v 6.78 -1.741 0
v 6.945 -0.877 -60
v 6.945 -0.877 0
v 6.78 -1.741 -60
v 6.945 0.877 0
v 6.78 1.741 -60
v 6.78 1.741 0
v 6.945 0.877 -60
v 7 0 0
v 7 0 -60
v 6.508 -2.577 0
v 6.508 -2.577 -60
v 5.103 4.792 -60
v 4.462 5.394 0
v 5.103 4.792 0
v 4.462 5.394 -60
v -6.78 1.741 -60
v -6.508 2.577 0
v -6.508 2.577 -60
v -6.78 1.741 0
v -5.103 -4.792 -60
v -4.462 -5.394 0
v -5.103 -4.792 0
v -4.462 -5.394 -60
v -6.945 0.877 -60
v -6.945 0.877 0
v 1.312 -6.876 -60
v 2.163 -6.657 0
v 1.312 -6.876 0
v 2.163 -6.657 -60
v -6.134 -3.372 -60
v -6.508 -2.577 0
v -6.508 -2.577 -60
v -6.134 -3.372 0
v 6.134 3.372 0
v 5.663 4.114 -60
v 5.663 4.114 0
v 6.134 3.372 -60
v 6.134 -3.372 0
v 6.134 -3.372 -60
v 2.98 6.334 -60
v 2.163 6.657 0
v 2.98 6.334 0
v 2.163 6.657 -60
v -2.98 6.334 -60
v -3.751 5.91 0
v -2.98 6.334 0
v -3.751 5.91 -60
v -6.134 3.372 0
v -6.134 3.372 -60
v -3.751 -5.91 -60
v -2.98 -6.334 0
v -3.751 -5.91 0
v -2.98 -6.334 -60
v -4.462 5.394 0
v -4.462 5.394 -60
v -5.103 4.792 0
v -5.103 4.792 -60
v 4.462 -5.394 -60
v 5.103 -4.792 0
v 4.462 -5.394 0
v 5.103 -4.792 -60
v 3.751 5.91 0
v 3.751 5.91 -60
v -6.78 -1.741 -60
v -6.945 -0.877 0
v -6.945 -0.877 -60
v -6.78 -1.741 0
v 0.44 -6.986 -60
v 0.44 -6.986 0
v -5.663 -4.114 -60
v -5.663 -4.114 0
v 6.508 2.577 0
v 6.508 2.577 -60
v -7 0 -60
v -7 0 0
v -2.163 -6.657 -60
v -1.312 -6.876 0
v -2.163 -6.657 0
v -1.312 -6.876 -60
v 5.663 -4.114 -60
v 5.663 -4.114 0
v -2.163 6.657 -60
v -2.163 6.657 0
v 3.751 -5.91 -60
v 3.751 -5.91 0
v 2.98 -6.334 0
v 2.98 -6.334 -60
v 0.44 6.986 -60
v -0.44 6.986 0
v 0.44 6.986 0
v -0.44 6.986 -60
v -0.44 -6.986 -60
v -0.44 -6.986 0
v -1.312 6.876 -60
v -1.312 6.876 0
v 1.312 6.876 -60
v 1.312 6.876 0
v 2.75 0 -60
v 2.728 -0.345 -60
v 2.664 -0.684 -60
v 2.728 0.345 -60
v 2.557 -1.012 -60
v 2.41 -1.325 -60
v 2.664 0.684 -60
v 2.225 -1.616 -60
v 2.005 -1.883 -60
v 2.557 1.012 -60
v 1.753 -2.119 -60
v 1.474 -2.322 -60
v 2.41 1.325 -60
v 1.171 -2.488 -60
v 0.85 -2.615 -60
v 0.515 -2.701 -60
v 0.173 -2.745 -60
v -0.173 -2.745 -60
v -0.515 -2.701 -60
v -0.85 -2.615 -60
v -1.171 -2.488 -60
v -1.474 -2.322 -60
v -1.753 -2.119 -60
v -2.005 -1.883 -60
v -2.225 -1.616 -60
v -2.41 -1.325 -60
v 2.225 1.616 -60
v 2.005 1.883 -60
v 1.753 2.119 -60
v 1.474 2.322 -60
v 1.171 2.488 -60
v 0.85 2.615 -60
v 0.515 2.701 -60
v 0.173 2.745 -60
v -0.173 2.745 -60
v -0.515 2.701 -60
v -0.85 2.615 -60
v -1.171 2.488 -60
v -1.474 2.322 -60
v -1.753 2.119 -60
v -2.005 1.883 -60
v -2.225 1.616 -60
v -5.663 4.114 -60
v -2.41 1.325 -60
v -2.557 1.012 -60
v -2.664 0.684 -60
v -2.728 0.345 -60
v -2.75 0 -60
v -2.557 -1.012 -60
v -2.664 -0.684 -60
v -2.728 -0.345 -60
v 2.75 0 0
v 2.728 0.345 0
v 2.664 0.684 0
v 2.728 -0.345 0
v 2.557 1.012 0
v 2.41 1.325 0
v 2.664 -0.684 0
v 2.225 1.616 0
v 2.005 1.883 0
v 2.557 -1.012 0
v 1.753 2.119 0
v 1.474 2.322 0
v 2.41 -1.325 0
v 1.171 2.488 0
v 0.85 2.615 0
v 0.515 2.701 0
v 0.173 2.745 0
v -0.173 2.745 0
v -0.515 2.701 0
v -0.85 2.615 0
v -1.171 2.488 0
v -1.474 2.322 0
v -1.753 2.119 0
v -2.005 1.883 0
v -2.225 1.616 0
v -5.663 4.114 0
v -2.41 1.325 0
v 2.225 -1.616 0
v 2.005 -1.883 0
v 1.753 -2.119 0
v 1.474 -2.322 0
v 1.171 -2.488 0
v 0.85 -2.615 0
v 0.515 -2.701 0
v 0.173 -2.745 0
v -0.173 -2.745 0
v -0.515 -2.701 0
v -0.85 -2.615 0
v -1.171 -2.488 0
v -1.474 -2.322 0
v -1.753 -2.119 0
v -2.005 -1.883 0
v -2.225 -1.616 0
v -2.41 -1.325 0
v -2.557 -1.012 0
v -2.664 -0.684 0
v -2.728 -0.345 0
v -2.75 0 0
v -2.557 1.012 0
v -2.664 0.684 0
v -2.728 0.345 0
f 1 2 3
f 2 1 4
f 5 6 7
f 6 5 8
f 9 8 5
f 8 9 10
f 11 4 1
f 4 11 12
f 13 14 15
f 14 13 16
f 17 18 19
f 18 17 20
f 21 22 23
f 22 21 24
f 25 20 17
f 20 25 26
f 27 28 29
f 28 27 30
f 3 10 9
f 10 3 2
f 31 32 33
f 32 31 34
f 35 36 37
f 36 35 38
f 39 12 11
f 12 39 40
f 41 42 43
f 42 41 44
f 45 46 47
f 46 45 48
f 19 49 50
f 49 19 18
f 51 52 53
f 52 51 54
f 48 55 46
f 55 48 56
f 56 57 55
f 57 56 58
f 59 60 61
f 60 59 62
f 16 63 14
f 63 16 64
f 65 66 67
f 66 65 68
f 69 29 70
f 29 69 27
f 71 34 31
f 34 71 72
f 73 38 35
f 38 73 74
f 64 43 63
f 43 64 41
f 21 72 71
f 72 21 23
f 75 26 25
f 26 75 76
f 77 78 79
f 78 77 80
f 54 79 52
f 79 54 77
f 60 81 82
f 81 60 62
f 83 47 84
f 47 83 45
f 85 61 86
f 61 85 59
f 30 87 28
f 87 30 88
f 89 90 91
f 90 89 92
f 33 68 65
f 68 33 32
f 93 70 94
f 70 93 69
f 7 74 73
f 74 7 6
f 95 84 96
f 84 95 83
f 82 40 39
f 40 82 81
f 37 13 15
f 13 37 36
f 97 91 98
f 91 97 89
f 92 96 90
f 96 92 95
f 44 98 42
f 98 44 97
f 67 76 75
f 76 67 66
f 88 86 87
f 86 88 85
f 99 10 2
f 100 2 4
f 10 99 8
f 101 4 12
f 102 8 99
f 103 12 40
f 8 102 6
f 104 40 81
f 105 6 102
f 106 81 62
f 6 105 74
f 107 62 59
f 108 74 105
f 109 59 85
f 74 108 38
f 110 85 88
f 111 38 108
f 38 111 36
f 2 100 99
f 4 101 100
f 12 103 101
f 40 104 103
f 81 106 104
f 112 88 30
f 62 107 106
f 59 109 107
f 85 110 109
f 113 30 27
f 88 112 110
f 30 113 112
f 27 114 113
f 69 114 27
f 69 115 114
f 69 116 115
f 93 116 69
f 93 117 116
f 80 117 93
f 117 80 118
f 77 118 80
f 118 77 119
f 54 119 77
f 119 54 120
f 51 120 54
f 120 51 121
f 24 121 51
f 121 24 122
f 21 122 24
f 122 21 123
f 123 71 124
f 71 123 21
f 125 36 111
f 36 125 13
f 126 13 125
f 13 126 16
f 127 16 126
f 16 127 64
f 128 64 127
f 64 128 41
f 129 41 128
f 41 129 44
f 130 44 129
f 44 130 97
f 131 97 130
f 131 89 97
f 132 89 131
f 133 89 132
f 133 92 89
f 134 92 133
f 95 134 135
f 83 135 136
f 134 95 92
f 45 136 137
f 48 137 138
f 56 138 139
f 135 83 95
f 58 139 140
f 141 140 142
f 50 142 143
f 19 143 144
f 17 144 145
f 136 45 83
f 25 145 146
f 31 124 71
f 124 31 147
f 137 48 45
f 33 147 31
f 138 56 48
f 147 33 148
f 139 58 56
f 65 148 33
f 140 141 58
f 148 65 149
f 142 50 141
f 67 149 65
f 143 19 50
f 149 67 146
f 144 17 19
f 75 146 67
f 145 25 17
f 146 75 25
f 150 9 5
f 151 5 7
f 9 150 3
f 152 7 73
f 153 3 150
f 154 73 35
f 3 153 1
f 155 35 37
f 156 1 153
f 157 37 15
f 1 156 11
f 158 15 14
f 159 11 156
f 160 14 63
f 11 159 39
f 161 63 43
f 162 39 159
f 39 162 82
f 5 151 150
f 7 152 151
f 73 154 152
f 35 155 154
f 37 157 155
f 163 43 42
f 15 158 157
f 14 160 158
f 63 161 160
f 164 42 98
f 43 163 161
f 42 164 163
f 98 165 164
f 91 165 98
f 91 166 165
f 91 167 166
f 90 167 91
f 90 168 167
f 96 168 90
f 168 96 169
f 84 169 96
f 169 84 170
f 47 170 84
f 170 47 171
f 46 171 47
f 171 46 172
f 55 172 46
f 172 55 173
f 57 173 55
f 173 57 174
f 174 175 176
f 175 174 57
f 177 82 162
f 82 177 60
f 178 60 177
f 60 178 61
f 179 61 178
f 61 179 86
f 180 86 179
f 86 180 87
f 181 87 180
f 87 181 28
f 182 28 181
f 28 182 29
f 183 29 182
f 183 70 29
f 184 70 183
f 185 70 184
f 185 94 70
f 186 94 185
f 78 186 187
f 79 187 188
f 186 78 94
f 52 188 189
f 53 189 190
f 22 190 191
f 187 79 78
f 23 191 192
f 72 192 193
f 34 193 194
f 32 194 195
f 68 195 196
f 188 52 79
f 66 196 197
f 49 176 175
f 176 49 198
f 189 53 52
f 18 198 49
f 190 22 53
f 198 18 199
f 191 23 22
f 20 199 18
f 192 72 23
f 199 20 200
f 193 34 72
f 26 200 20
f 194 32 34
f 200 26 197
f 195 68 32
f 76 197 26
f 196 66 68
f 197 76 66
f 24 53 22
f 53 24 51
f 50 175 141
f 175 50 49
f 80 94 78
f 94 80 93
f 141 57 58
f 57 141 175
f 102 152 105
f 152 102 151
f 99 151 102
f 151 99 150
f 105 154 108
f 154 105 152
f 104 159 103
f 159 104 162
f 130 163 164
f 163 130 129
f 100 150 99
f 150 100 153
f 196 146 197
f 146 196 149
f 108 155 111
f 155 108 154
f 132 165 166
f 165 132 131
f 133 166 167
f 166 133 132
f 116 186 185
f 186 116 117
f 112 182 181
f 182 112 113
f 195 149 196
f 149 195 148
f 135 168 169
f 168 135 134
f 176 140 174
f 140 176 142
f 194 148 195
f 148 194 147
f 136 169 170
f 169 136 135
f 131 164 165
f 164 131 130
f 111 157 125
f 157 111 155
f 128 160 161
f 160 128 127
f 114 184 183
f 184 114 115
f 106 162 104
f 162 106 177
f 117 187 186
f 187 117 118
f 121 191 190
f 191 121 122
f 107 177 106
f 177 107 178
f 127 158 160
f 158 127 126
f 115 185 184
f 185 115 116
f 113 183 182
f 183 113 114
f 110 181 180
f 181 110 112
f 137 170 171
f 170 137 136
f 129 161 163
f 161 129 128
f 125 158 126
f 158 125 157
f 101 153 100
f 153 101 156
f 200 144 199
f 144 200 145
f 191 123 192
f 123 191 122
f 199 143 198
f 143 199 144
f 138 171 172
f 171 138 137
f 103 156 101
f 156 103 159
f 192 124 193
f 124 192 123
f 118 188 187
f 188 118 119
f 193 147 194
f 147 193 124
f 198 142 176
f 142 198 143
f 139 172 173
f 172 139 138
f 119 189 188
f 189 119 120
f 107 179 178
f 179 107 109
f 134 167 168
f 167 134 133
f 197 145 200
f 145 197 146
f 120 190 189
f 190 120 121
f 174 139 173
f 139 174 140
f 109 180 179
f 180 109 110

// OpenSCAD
$fn = 50;


difference() {
	union() {
		translate(v = [0, 0, -60.0000000000]) {
			cylinder(h = 60, r = 7.0000000000);
		}
	}
	union() {
		#translate(v = [0, 0, -60]) {
			cylinder(h = 60, r = 2.7500000000);
		}
	}
}
